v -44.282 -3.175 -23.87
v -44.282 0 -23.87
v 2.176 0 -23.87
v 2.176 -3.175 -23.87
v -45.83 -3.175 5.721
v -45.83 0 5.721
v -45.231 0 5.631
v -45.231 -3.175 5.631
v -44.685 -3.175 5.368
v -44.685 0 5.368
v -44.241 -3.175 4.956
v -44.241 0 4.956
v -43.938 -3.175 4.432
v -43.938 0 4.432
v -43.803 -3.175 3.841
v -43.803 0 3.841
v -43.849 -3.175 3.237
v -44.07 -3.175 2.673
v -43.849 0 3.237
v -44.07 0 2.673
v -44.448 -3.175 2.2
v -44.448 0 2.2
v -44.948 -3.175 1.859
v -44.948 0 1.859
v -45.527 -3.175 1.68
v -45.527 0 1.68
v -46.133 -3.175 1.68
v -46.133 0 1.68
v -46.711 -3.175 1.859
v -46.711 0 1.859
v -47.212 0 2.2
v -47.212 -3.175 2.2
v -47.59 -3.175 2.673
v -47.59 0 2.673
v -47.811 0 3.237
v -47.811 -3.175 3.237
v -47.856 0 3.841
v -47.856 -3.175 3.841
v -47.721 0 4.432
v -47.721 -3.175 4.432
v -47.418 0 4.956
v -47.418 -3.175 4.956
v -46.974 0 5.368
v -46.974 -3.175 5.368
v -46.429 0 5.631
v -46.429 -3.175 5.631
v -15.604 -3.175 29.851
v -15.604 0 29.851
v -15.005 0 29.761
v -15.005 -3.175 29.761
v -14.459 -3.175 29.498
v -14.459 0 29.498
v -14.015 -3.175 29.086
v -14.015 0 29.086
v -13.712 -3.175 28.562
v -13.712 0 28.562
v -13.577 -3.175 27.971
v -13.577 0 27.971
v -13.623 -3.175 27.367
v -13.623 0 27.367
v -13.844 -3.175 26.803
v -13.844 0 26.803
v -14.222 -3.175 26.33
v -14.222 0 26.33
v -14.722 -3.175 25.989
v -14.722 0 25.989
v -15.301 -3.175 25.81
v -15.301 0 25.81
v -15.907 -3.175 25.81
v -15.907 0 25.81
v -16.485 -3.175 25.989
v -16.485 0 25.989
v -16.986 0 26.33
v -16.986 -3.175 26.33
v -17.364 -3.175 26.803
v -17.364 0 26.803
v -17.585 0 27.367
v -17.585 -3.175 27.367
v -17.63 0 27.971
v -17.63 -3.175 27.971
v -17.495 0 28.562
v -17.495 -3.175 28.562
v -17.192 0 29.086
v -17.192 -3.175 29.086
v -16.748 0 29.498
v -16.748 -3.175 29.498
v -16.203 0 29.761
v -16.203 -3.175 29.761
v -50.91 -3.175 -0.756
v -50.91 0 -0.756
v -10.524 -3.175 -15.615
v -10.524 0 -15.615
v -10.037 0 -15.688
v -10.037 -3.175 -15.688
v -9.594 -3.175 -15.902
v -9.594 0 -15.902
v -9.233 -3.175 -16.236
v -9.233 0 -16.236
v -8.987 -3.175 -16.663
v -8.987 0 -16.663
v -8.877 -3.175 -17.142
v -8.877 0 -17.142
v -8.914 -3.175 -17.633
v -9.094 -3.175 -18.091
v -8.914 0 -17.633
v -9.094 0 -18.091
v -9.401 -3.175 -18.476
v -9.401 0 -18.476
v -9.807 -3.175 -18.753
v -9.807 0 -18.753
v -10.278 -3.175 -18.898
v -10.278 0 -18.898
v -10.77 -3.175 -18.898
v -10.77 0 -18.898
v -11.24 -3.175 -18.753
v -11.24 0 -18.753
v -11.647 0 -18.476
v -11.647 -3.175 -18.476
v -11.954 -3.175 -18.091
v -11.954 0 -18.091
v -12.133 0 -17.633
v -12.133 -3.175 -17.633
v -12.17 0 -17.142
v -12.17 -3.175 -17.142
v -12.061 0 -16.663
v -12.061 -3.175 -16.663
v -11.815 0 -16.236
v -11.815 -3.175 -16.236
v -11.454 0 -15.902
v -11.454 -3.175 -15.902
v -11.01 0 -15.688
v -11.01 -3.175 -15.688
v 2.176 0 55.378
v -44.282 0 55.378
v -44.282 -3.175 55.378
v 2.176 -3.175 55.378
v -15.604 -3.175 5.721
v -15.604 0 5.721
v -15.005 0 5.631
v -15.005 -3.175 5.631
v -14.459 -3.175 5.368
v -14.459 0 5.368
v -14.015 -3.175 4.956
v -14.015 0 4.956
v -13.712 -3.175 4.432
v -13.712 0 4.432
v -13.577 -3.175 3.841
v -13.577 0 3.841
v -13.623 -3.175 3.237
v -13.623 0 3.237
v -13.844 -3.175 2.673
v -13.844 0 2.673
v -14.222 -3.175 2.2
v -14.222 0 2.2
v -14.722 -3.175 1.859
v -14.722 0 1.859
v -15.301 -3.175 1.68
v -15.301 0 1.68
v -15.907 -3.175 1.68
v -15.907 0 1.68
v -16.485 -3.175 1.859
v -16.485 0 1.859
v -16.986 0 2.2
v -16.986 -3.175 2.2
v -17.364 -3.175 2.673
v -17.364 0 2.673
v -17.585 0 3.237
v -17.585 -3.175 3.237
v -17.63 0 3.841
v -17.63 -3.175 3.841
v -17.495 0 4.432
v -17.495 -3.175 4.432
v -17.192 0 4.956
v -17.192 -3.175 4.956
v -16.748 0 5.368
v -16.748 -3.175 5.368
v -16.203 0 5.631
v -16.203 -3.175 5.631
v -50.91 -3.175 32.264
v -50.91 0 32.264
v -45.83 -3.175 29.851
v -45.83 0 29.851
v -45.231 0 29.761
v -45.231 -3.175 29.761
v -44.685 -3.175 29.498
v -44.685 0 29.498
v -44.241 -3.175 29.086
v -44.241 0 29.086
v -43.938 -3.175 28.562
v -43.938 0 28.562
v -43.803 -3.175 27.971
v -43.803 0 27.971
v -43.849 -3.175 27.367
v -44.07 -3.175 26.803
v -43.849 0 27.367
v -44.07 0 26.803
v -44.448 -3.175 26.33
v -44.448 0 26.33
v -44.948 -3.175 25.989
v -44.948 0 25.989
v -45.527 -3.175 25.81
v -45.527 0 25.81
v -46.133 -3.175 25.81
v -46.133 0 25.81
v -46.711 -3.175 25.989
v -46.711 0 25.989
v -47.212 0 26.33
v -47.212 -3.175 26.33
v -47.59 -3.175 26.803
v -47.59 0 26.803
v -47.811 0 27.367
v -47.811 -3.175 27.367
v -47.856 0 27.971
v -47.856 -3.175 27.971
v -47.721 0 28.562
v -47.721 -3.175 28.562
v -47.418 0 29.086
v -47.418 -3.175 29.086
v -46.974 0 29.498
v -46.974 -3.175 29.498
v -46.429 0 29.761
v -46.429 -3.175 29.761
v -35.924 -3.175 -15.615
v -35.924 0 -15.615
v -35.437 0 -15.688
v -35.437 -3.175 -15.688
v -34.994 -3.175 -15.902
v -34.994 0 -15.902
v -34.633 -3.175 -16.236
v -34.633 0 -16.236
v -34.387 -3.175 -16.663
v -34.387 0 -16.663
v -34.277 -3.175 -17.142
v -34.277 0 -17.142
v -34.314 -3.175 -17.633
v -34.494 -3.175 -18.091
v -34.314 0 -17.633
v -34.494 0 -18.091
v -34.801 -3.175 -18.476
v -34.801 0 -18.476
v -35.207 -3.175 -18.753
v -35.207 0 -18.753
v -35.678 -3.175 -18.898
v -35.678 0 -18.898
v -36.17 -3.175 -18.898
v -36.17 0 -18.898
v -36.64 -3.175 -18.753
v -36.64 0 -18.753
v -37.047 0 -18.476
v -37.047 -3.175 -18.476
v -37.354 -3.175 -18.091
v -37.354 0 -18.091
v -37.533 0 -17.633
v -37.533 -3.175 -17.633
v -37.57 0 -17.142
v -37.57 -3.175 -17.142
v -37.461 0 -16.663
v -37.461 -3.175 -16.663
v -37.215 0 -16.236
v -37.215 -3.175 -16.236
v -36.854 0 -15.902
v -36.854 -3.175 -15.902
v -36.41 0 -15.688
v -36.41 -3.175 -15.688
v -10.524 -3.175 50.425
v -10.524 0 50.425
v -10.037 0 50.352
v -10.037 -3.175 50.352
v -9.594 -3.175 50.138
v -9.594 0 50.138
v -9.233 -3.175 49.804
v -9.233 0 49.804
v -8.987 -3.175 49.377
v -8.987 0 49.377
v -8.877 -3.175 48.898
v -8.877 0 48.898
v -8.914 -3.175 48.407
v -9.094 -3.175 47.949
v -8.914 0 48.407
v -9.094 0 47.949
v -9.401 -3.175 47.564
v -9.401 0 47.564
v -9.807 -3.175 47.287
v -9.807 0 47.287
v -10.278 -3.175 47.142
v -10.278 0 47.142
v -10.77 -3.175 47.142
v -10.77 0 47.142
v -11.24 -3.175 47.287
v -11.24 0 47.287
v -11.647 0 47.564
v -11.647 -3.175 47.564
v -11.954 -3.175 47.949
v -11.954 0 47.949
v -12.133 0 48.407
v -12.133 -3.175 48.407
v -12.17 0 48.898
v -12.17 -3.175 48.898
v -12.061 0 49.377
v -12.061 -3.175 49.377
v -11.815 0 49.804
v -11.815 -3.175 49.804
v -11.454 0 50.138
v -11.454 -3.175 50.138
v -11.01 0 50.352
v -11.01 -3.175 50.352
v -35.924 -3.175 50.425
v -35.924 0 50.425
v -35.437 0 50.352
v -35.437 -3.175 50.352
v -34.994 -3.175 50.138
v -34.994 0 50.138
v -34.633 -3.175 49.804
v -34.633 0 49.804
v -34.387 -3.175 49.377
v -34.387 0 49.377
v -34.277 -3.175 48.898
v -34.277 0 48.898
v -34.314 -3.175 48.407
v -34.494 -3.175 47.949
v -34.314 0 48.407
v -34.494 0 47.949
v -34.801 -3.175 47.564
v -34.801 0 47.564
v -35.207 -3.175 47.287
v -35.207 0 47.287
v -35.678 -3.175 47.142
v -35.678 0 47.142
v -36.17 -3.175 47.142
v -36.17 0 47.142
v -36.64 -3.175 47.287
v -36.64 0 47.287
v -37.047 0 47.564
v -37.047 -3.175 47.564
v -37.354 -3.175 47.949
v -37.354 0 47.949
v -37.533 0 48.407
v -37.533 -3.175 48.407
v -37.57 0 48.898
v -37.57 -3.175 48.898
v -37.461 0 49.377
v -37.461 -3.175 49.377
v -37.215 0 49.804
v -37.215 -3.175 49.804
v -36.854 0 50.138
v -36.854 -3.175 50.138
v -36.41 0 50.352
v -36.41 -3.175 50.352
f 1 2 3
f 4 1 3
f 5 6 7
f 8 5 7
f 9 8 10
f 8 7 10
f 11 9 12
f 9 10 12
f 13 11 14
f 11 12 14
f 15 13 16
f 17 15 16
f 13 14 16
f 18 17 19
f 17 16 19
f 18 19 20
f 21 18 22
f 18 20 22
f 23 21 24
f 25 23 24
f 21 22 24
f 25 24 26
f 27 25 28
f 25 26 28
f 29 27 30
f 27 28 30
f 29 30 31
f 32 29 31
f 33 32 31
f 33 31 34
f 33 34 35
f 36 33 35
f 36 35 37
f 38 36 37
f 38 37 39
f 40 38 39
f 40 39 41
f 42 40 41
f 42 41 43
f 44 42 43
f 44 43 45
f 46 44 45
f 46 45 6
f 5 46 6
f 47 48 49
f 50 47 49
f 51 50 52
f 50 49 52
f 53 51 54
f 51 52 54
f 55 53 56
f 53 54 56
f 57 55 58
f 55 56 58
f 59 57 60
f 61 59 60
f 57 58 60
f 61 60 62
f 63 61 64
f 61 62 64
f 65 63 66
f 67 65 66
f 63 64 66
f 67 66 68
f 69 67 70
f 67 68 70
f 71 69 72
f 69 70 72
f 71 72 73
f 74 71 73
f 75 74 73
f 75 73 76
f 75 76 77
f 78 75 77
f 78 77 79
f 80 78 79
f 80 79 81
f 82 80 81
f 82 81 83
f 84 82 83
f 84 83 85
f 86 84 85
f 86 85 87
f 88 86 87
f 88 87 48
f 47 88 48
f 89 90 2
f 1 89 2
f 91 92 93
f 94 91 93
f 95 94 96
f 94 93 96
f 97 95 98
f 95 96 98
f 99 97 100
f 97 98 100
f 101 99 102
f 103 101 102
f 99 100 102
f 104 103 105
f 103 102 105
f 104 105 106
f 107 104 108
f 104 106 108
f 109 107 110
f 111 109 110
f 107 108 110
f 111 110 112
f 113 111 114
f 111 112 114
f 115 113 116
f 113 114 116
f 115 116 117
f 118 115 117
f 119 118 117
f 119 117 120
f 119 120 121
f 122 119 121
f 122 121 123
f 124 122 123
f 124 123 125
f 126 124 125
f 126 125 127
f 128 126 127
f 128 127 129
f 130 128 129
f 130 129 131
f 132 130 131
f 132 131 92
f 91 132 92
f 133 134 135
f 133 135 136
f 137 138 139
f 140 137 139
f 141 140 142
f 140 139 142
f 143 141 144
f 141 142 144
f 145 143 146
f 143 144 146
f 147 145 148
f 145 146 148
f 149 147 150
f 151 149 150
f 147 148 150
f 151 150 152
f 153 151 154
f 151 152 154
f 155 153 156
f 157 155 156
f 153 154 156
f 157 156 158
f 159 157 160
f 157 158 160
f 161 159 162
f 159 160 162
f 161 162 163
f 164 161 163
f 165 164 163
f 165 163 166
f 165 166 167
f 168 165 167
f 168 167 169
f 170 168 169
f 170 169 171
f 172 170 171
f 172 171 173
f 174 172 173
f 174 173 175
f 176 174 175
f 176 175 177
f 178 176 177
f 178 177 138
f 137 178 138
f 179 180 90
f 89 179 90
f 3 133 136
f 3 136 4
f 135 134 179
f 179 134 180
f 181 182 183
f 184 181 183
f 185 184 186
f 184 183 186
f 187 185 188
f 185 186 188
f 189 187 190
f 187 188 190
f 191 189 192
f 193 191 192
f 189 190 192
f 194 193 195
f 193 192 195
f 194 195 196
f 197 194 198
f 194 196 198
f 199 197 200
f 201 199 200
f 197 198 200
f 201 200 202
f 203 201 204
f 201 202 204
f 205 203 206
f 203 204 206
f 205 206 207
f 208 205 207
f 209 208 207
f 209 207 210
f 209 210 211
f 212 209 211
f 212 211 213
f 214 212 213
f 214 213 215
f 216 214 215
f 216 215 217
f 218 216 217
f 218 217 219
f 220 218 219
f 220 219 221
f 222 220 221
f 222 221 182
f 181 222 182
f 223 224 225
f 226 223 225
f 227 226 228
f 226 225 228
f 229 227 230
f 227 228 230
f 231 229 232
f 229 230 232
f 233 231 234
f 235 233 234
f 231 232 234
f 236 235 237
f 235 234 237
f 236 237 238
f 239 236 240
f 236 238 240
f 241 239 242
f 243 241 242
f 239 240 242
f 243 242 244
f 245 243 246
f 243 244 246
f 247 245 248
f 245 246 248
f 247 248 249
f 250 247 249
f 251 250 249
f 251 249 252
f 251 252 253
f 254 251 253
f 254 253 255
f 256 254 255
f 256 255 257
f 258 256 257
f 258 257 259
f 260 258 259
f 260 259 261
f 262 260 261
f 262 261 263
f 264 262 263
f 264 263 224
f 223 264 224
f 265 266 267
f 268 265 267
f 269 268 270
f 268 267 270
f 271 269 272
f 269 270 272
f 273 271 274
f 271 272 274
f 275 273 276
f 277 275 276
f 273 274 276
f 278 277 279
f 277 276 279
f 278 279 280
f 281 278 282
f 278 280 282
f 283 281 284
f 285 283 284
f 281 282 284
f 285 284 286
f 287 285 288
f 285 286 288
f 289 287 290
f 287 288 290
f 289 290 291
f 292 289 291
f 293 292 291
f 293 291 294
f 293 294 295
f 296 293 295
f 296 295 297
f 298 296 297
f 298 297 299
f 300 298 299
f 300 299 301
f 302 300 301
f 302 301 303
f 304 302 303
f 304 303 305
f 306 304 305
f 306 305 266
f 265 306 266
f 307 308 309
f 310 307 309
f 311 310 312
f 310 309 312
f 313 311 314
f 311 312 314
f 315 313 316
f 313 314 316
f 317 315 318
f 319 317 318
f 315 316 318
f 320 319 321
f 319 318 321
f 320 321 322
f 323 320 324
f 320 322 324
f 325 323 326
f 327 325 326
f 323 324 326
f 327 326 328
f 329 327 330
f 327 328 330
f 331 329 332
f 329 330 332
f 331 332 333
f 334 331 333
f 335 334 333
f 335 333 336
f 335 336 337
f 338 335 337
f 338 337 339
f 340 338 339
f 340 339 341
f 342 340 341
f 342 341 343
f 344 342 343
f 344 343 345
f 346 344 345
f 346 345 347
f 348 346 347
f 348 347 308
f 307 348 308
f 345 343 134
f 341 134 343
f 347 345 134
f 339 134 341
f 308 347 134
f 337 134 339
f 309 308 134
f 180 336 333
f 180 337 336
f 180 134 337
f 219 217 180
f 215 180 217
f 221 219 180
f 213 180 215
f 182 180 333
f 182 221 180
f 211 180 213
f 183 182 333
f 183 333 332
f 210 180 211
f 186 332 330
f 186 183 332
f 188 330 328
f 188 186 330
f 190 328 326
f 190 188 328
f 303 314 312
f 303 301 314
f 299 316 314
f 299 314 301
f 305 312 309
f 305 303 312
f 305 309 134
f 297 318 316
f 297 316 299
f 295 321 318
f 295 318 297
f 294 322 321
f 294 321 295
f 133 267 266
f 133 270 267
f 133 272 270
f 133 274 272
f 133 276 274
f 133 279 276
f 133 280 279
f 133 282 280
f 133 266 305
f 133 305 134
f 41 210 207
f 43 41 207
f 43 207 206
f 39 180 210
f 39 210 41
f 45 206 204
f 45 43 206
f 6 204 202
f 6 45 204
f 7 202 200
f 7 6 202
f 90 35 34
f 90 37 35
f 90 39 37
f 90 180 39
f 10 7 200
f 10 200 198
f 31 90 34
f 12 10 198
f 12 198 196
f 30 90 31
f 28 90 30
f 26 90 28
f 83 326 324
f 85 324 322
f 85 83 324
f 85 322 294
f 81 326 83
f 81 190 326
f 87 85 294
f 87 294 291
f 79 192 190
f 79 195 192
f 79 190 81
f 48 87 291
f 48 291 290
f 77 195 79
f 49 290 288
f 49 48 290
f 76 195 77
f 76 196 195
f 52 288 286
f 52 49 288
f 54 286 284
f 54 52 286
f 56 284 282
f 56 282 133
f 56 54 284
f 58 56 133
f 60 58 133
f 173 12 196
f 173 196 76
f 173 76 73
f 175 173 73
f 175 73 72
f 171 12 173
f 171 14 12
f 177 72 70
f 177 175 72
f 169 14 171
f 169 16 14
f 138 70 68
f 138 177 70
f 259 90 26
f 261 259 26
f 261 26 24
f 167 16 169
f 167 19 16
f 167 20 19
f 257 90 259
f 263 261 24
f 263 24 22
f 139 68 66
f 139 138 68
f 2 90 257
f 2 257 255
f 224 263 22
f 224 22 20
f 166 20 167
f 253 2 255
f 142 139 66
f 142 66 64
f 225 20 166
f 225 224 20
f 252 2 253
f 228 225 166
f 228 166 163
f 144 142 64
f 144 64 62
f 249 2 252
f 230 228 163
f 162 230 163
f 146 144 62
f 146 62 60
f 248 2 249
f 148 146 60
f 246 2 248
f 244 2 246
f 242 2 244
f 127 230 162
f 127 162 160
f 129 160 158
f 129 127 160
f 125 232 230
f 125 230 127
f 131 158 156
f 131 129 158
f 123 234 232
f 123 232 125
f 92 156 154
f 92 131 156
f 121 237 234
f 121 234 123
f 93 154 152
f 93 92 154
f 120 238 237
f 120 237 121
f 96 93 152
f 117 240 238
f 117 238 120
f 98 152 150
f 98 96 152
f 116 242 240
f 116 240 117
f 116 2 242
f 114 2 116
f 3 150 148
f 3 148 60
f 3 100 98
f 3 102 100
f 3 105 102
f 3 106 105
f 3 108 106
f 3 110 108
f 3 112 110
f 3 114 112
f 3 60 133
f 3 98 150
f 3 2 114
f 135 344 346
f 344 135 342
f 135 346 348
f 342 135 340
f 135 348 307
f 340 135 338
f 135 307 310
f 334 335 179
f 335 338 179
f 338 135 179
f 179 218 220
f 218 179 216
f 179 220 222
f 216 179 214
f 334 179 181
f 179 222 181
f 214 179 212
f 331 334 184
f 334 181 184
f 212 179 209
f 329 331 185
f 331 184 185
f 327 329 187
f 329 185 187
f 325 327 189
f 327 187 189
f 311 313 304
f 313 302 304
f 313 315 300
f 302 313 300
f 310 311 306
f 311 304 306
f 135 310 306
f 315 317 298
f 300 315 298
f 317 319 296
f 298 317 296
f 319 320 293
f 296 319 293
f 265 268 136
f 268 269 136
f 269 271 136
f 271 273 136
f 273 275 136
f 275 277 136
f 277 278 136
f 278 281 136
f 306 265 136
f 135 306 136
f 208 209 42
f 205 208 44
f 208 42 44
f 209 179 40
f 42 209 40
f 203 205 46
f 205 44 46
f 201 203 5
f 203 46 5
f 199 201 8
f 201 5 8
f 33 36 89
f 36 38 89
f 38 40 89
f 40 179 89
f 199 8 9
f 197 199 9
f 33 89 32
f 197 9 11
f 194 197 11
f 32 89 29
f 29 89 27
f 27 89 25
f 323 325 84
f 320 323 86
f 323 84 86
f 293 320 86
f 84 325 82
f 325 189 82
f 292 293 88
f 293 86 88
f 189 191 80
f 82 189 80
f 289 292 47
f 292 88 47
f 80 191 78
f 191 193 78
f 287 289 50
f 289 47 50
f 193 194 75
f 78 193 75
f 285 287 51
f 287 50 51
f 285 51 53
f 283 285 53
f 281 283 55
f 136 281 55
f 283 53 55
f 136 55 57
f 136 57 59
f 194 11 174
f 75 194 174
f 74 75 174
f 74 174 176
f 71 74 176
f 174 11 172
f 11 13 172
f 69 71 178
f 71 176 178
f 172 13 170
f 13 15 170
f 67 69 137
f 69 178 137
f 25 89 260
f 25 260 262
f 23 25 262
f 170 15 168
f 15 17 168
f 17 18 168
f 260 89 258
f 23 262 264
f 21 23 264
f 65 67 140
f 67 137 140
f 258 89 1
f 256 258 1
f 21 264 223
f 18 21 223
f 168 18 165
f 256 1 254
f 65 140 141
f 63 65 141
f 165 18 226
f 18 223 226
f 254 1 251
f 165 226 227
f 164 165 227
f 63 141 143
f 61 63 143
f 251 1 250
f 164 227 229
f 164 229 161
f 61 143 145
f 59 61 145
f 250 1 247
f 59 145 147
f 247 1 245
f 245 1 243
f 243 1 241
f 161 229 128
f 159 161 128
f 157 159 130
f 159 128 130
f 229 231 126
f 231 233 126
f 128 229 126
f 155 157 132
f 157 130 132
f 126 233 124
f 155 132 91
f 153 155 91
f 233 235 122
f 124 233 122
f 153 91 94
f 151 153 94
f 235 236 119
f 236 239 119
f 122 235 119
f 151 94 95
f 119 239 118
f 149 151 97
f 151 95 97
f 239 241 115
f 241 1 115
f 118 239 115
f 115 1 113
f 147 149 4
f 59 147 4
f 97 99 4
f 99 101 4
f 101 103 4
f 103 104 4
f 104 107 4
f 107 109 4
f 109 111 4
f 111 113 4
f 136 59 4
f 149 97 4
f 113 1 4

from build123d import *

# Parameters (mm, degrees)
SKETCH1_W           = 57.15
SKETCH1_H           = 79.248
BOSS_EXTRUDE1_DEPTH = 3.175
SKETCH2_R           = 1.651
CUT_EXTRUDE1_DEPTH  = 79.095767635
SKETCH3_R           = 2.032
CUT_EXTRUDE2_DEPTH  = 79.095767635
CUT_EXTRUDE3_DEPTH  = 79.095767635


with BuildPart() as part:
    # Sketch1 → Boss-Extrude1 (new body)
    with BuildSketch(Plane(origin=(0, 0, 0), x_dir=(1, 0, 0), z_dir=(0, 1, 0))):
        with Locations((-26.398757506, -15.754283497)):
            Rectangle(SKETCH1_W, SKETCH1_H)
    extrude(amount=-BOSS_EXTRUDE1_DEPTH)

    # Sketch2 → Cut-Extrude1 (cut, through all)
    with BuildSketch(Plane(origin=(0, 0, 0), x_dir=(1, 0, 0), z_dir=(0, 1, 0))):
        with Locations(Location((-35.923757506, -48.774283497, 0), (0, 0, 270))):
            Circle(SKETCH2_R)
        with Locations(Location((-35.923757506, 17.265716503, 0), (0, 0, 270))):
            Circle(SKETCH2_R)
        with Locations(Location((-10.523757506, -48.774283497, 0), (0, 0, 270))):
            Circle(SKETCH2_R)
        with Locations(Location((-10.523757506, 17.265716503, 0), (0, 0, 270))):
            Circle(SKETCH2_R)
    extrude(amount=-CUT_EXTRUDE1_DEPTH, mode=Mode.SUBTRACT)

    # Sketch3 → Cut-Extrude2 (cut, through all)
    with BuildSketch(Plane(origin=(0, 0, 0), x_dir=(1, 0, 0), z_dir=(0, 1, 0))):
        with Locations(Location((-45.829757506, -3.689283497, 0), (0, 0, 270))):
            Circle(SKETCH3_R)
        with Locations(Location((-15.603757506, -3.689283497, 0), (0, 0, 270))):
            Circle(SKETCH3_R)
        with Locations(Location((-45.829757506, -27.819283497, 0), (0, 0, 270))):
            Circle(SKETCH3_R)
        with Locations(Location((-15.603757506, -27.819283497, 0), (0, 0, 270))):
            Circle(SKETCH3_R)
    extrude(amount=-CUT_EXTRUDE2_DEPTH, mode=Mode.SUBTRACT)

    # Sketch4 → Cut-Extrude3 (cut, through all)
    with BuildSketch(Plane(origin=(0, 0, 0), x_dir=(1, 0, 0), z_dir=(0, 1, 0))):
        Polygon((-50.909757506, -32.264283497), (-50.909757506, 0.755716503), (-40.921106308, 35.590282968), (-90.515991817, 35.590282968), (-90.515991817, -67.098849962), (-50.909757506, -67.098849962), (-40.921106308, -67.098849962), align=None)
    extrude(amount=-CUT_EXTRUDE3_DEPTH, mode=Mode.SUBTRACT)


solid = part.part
